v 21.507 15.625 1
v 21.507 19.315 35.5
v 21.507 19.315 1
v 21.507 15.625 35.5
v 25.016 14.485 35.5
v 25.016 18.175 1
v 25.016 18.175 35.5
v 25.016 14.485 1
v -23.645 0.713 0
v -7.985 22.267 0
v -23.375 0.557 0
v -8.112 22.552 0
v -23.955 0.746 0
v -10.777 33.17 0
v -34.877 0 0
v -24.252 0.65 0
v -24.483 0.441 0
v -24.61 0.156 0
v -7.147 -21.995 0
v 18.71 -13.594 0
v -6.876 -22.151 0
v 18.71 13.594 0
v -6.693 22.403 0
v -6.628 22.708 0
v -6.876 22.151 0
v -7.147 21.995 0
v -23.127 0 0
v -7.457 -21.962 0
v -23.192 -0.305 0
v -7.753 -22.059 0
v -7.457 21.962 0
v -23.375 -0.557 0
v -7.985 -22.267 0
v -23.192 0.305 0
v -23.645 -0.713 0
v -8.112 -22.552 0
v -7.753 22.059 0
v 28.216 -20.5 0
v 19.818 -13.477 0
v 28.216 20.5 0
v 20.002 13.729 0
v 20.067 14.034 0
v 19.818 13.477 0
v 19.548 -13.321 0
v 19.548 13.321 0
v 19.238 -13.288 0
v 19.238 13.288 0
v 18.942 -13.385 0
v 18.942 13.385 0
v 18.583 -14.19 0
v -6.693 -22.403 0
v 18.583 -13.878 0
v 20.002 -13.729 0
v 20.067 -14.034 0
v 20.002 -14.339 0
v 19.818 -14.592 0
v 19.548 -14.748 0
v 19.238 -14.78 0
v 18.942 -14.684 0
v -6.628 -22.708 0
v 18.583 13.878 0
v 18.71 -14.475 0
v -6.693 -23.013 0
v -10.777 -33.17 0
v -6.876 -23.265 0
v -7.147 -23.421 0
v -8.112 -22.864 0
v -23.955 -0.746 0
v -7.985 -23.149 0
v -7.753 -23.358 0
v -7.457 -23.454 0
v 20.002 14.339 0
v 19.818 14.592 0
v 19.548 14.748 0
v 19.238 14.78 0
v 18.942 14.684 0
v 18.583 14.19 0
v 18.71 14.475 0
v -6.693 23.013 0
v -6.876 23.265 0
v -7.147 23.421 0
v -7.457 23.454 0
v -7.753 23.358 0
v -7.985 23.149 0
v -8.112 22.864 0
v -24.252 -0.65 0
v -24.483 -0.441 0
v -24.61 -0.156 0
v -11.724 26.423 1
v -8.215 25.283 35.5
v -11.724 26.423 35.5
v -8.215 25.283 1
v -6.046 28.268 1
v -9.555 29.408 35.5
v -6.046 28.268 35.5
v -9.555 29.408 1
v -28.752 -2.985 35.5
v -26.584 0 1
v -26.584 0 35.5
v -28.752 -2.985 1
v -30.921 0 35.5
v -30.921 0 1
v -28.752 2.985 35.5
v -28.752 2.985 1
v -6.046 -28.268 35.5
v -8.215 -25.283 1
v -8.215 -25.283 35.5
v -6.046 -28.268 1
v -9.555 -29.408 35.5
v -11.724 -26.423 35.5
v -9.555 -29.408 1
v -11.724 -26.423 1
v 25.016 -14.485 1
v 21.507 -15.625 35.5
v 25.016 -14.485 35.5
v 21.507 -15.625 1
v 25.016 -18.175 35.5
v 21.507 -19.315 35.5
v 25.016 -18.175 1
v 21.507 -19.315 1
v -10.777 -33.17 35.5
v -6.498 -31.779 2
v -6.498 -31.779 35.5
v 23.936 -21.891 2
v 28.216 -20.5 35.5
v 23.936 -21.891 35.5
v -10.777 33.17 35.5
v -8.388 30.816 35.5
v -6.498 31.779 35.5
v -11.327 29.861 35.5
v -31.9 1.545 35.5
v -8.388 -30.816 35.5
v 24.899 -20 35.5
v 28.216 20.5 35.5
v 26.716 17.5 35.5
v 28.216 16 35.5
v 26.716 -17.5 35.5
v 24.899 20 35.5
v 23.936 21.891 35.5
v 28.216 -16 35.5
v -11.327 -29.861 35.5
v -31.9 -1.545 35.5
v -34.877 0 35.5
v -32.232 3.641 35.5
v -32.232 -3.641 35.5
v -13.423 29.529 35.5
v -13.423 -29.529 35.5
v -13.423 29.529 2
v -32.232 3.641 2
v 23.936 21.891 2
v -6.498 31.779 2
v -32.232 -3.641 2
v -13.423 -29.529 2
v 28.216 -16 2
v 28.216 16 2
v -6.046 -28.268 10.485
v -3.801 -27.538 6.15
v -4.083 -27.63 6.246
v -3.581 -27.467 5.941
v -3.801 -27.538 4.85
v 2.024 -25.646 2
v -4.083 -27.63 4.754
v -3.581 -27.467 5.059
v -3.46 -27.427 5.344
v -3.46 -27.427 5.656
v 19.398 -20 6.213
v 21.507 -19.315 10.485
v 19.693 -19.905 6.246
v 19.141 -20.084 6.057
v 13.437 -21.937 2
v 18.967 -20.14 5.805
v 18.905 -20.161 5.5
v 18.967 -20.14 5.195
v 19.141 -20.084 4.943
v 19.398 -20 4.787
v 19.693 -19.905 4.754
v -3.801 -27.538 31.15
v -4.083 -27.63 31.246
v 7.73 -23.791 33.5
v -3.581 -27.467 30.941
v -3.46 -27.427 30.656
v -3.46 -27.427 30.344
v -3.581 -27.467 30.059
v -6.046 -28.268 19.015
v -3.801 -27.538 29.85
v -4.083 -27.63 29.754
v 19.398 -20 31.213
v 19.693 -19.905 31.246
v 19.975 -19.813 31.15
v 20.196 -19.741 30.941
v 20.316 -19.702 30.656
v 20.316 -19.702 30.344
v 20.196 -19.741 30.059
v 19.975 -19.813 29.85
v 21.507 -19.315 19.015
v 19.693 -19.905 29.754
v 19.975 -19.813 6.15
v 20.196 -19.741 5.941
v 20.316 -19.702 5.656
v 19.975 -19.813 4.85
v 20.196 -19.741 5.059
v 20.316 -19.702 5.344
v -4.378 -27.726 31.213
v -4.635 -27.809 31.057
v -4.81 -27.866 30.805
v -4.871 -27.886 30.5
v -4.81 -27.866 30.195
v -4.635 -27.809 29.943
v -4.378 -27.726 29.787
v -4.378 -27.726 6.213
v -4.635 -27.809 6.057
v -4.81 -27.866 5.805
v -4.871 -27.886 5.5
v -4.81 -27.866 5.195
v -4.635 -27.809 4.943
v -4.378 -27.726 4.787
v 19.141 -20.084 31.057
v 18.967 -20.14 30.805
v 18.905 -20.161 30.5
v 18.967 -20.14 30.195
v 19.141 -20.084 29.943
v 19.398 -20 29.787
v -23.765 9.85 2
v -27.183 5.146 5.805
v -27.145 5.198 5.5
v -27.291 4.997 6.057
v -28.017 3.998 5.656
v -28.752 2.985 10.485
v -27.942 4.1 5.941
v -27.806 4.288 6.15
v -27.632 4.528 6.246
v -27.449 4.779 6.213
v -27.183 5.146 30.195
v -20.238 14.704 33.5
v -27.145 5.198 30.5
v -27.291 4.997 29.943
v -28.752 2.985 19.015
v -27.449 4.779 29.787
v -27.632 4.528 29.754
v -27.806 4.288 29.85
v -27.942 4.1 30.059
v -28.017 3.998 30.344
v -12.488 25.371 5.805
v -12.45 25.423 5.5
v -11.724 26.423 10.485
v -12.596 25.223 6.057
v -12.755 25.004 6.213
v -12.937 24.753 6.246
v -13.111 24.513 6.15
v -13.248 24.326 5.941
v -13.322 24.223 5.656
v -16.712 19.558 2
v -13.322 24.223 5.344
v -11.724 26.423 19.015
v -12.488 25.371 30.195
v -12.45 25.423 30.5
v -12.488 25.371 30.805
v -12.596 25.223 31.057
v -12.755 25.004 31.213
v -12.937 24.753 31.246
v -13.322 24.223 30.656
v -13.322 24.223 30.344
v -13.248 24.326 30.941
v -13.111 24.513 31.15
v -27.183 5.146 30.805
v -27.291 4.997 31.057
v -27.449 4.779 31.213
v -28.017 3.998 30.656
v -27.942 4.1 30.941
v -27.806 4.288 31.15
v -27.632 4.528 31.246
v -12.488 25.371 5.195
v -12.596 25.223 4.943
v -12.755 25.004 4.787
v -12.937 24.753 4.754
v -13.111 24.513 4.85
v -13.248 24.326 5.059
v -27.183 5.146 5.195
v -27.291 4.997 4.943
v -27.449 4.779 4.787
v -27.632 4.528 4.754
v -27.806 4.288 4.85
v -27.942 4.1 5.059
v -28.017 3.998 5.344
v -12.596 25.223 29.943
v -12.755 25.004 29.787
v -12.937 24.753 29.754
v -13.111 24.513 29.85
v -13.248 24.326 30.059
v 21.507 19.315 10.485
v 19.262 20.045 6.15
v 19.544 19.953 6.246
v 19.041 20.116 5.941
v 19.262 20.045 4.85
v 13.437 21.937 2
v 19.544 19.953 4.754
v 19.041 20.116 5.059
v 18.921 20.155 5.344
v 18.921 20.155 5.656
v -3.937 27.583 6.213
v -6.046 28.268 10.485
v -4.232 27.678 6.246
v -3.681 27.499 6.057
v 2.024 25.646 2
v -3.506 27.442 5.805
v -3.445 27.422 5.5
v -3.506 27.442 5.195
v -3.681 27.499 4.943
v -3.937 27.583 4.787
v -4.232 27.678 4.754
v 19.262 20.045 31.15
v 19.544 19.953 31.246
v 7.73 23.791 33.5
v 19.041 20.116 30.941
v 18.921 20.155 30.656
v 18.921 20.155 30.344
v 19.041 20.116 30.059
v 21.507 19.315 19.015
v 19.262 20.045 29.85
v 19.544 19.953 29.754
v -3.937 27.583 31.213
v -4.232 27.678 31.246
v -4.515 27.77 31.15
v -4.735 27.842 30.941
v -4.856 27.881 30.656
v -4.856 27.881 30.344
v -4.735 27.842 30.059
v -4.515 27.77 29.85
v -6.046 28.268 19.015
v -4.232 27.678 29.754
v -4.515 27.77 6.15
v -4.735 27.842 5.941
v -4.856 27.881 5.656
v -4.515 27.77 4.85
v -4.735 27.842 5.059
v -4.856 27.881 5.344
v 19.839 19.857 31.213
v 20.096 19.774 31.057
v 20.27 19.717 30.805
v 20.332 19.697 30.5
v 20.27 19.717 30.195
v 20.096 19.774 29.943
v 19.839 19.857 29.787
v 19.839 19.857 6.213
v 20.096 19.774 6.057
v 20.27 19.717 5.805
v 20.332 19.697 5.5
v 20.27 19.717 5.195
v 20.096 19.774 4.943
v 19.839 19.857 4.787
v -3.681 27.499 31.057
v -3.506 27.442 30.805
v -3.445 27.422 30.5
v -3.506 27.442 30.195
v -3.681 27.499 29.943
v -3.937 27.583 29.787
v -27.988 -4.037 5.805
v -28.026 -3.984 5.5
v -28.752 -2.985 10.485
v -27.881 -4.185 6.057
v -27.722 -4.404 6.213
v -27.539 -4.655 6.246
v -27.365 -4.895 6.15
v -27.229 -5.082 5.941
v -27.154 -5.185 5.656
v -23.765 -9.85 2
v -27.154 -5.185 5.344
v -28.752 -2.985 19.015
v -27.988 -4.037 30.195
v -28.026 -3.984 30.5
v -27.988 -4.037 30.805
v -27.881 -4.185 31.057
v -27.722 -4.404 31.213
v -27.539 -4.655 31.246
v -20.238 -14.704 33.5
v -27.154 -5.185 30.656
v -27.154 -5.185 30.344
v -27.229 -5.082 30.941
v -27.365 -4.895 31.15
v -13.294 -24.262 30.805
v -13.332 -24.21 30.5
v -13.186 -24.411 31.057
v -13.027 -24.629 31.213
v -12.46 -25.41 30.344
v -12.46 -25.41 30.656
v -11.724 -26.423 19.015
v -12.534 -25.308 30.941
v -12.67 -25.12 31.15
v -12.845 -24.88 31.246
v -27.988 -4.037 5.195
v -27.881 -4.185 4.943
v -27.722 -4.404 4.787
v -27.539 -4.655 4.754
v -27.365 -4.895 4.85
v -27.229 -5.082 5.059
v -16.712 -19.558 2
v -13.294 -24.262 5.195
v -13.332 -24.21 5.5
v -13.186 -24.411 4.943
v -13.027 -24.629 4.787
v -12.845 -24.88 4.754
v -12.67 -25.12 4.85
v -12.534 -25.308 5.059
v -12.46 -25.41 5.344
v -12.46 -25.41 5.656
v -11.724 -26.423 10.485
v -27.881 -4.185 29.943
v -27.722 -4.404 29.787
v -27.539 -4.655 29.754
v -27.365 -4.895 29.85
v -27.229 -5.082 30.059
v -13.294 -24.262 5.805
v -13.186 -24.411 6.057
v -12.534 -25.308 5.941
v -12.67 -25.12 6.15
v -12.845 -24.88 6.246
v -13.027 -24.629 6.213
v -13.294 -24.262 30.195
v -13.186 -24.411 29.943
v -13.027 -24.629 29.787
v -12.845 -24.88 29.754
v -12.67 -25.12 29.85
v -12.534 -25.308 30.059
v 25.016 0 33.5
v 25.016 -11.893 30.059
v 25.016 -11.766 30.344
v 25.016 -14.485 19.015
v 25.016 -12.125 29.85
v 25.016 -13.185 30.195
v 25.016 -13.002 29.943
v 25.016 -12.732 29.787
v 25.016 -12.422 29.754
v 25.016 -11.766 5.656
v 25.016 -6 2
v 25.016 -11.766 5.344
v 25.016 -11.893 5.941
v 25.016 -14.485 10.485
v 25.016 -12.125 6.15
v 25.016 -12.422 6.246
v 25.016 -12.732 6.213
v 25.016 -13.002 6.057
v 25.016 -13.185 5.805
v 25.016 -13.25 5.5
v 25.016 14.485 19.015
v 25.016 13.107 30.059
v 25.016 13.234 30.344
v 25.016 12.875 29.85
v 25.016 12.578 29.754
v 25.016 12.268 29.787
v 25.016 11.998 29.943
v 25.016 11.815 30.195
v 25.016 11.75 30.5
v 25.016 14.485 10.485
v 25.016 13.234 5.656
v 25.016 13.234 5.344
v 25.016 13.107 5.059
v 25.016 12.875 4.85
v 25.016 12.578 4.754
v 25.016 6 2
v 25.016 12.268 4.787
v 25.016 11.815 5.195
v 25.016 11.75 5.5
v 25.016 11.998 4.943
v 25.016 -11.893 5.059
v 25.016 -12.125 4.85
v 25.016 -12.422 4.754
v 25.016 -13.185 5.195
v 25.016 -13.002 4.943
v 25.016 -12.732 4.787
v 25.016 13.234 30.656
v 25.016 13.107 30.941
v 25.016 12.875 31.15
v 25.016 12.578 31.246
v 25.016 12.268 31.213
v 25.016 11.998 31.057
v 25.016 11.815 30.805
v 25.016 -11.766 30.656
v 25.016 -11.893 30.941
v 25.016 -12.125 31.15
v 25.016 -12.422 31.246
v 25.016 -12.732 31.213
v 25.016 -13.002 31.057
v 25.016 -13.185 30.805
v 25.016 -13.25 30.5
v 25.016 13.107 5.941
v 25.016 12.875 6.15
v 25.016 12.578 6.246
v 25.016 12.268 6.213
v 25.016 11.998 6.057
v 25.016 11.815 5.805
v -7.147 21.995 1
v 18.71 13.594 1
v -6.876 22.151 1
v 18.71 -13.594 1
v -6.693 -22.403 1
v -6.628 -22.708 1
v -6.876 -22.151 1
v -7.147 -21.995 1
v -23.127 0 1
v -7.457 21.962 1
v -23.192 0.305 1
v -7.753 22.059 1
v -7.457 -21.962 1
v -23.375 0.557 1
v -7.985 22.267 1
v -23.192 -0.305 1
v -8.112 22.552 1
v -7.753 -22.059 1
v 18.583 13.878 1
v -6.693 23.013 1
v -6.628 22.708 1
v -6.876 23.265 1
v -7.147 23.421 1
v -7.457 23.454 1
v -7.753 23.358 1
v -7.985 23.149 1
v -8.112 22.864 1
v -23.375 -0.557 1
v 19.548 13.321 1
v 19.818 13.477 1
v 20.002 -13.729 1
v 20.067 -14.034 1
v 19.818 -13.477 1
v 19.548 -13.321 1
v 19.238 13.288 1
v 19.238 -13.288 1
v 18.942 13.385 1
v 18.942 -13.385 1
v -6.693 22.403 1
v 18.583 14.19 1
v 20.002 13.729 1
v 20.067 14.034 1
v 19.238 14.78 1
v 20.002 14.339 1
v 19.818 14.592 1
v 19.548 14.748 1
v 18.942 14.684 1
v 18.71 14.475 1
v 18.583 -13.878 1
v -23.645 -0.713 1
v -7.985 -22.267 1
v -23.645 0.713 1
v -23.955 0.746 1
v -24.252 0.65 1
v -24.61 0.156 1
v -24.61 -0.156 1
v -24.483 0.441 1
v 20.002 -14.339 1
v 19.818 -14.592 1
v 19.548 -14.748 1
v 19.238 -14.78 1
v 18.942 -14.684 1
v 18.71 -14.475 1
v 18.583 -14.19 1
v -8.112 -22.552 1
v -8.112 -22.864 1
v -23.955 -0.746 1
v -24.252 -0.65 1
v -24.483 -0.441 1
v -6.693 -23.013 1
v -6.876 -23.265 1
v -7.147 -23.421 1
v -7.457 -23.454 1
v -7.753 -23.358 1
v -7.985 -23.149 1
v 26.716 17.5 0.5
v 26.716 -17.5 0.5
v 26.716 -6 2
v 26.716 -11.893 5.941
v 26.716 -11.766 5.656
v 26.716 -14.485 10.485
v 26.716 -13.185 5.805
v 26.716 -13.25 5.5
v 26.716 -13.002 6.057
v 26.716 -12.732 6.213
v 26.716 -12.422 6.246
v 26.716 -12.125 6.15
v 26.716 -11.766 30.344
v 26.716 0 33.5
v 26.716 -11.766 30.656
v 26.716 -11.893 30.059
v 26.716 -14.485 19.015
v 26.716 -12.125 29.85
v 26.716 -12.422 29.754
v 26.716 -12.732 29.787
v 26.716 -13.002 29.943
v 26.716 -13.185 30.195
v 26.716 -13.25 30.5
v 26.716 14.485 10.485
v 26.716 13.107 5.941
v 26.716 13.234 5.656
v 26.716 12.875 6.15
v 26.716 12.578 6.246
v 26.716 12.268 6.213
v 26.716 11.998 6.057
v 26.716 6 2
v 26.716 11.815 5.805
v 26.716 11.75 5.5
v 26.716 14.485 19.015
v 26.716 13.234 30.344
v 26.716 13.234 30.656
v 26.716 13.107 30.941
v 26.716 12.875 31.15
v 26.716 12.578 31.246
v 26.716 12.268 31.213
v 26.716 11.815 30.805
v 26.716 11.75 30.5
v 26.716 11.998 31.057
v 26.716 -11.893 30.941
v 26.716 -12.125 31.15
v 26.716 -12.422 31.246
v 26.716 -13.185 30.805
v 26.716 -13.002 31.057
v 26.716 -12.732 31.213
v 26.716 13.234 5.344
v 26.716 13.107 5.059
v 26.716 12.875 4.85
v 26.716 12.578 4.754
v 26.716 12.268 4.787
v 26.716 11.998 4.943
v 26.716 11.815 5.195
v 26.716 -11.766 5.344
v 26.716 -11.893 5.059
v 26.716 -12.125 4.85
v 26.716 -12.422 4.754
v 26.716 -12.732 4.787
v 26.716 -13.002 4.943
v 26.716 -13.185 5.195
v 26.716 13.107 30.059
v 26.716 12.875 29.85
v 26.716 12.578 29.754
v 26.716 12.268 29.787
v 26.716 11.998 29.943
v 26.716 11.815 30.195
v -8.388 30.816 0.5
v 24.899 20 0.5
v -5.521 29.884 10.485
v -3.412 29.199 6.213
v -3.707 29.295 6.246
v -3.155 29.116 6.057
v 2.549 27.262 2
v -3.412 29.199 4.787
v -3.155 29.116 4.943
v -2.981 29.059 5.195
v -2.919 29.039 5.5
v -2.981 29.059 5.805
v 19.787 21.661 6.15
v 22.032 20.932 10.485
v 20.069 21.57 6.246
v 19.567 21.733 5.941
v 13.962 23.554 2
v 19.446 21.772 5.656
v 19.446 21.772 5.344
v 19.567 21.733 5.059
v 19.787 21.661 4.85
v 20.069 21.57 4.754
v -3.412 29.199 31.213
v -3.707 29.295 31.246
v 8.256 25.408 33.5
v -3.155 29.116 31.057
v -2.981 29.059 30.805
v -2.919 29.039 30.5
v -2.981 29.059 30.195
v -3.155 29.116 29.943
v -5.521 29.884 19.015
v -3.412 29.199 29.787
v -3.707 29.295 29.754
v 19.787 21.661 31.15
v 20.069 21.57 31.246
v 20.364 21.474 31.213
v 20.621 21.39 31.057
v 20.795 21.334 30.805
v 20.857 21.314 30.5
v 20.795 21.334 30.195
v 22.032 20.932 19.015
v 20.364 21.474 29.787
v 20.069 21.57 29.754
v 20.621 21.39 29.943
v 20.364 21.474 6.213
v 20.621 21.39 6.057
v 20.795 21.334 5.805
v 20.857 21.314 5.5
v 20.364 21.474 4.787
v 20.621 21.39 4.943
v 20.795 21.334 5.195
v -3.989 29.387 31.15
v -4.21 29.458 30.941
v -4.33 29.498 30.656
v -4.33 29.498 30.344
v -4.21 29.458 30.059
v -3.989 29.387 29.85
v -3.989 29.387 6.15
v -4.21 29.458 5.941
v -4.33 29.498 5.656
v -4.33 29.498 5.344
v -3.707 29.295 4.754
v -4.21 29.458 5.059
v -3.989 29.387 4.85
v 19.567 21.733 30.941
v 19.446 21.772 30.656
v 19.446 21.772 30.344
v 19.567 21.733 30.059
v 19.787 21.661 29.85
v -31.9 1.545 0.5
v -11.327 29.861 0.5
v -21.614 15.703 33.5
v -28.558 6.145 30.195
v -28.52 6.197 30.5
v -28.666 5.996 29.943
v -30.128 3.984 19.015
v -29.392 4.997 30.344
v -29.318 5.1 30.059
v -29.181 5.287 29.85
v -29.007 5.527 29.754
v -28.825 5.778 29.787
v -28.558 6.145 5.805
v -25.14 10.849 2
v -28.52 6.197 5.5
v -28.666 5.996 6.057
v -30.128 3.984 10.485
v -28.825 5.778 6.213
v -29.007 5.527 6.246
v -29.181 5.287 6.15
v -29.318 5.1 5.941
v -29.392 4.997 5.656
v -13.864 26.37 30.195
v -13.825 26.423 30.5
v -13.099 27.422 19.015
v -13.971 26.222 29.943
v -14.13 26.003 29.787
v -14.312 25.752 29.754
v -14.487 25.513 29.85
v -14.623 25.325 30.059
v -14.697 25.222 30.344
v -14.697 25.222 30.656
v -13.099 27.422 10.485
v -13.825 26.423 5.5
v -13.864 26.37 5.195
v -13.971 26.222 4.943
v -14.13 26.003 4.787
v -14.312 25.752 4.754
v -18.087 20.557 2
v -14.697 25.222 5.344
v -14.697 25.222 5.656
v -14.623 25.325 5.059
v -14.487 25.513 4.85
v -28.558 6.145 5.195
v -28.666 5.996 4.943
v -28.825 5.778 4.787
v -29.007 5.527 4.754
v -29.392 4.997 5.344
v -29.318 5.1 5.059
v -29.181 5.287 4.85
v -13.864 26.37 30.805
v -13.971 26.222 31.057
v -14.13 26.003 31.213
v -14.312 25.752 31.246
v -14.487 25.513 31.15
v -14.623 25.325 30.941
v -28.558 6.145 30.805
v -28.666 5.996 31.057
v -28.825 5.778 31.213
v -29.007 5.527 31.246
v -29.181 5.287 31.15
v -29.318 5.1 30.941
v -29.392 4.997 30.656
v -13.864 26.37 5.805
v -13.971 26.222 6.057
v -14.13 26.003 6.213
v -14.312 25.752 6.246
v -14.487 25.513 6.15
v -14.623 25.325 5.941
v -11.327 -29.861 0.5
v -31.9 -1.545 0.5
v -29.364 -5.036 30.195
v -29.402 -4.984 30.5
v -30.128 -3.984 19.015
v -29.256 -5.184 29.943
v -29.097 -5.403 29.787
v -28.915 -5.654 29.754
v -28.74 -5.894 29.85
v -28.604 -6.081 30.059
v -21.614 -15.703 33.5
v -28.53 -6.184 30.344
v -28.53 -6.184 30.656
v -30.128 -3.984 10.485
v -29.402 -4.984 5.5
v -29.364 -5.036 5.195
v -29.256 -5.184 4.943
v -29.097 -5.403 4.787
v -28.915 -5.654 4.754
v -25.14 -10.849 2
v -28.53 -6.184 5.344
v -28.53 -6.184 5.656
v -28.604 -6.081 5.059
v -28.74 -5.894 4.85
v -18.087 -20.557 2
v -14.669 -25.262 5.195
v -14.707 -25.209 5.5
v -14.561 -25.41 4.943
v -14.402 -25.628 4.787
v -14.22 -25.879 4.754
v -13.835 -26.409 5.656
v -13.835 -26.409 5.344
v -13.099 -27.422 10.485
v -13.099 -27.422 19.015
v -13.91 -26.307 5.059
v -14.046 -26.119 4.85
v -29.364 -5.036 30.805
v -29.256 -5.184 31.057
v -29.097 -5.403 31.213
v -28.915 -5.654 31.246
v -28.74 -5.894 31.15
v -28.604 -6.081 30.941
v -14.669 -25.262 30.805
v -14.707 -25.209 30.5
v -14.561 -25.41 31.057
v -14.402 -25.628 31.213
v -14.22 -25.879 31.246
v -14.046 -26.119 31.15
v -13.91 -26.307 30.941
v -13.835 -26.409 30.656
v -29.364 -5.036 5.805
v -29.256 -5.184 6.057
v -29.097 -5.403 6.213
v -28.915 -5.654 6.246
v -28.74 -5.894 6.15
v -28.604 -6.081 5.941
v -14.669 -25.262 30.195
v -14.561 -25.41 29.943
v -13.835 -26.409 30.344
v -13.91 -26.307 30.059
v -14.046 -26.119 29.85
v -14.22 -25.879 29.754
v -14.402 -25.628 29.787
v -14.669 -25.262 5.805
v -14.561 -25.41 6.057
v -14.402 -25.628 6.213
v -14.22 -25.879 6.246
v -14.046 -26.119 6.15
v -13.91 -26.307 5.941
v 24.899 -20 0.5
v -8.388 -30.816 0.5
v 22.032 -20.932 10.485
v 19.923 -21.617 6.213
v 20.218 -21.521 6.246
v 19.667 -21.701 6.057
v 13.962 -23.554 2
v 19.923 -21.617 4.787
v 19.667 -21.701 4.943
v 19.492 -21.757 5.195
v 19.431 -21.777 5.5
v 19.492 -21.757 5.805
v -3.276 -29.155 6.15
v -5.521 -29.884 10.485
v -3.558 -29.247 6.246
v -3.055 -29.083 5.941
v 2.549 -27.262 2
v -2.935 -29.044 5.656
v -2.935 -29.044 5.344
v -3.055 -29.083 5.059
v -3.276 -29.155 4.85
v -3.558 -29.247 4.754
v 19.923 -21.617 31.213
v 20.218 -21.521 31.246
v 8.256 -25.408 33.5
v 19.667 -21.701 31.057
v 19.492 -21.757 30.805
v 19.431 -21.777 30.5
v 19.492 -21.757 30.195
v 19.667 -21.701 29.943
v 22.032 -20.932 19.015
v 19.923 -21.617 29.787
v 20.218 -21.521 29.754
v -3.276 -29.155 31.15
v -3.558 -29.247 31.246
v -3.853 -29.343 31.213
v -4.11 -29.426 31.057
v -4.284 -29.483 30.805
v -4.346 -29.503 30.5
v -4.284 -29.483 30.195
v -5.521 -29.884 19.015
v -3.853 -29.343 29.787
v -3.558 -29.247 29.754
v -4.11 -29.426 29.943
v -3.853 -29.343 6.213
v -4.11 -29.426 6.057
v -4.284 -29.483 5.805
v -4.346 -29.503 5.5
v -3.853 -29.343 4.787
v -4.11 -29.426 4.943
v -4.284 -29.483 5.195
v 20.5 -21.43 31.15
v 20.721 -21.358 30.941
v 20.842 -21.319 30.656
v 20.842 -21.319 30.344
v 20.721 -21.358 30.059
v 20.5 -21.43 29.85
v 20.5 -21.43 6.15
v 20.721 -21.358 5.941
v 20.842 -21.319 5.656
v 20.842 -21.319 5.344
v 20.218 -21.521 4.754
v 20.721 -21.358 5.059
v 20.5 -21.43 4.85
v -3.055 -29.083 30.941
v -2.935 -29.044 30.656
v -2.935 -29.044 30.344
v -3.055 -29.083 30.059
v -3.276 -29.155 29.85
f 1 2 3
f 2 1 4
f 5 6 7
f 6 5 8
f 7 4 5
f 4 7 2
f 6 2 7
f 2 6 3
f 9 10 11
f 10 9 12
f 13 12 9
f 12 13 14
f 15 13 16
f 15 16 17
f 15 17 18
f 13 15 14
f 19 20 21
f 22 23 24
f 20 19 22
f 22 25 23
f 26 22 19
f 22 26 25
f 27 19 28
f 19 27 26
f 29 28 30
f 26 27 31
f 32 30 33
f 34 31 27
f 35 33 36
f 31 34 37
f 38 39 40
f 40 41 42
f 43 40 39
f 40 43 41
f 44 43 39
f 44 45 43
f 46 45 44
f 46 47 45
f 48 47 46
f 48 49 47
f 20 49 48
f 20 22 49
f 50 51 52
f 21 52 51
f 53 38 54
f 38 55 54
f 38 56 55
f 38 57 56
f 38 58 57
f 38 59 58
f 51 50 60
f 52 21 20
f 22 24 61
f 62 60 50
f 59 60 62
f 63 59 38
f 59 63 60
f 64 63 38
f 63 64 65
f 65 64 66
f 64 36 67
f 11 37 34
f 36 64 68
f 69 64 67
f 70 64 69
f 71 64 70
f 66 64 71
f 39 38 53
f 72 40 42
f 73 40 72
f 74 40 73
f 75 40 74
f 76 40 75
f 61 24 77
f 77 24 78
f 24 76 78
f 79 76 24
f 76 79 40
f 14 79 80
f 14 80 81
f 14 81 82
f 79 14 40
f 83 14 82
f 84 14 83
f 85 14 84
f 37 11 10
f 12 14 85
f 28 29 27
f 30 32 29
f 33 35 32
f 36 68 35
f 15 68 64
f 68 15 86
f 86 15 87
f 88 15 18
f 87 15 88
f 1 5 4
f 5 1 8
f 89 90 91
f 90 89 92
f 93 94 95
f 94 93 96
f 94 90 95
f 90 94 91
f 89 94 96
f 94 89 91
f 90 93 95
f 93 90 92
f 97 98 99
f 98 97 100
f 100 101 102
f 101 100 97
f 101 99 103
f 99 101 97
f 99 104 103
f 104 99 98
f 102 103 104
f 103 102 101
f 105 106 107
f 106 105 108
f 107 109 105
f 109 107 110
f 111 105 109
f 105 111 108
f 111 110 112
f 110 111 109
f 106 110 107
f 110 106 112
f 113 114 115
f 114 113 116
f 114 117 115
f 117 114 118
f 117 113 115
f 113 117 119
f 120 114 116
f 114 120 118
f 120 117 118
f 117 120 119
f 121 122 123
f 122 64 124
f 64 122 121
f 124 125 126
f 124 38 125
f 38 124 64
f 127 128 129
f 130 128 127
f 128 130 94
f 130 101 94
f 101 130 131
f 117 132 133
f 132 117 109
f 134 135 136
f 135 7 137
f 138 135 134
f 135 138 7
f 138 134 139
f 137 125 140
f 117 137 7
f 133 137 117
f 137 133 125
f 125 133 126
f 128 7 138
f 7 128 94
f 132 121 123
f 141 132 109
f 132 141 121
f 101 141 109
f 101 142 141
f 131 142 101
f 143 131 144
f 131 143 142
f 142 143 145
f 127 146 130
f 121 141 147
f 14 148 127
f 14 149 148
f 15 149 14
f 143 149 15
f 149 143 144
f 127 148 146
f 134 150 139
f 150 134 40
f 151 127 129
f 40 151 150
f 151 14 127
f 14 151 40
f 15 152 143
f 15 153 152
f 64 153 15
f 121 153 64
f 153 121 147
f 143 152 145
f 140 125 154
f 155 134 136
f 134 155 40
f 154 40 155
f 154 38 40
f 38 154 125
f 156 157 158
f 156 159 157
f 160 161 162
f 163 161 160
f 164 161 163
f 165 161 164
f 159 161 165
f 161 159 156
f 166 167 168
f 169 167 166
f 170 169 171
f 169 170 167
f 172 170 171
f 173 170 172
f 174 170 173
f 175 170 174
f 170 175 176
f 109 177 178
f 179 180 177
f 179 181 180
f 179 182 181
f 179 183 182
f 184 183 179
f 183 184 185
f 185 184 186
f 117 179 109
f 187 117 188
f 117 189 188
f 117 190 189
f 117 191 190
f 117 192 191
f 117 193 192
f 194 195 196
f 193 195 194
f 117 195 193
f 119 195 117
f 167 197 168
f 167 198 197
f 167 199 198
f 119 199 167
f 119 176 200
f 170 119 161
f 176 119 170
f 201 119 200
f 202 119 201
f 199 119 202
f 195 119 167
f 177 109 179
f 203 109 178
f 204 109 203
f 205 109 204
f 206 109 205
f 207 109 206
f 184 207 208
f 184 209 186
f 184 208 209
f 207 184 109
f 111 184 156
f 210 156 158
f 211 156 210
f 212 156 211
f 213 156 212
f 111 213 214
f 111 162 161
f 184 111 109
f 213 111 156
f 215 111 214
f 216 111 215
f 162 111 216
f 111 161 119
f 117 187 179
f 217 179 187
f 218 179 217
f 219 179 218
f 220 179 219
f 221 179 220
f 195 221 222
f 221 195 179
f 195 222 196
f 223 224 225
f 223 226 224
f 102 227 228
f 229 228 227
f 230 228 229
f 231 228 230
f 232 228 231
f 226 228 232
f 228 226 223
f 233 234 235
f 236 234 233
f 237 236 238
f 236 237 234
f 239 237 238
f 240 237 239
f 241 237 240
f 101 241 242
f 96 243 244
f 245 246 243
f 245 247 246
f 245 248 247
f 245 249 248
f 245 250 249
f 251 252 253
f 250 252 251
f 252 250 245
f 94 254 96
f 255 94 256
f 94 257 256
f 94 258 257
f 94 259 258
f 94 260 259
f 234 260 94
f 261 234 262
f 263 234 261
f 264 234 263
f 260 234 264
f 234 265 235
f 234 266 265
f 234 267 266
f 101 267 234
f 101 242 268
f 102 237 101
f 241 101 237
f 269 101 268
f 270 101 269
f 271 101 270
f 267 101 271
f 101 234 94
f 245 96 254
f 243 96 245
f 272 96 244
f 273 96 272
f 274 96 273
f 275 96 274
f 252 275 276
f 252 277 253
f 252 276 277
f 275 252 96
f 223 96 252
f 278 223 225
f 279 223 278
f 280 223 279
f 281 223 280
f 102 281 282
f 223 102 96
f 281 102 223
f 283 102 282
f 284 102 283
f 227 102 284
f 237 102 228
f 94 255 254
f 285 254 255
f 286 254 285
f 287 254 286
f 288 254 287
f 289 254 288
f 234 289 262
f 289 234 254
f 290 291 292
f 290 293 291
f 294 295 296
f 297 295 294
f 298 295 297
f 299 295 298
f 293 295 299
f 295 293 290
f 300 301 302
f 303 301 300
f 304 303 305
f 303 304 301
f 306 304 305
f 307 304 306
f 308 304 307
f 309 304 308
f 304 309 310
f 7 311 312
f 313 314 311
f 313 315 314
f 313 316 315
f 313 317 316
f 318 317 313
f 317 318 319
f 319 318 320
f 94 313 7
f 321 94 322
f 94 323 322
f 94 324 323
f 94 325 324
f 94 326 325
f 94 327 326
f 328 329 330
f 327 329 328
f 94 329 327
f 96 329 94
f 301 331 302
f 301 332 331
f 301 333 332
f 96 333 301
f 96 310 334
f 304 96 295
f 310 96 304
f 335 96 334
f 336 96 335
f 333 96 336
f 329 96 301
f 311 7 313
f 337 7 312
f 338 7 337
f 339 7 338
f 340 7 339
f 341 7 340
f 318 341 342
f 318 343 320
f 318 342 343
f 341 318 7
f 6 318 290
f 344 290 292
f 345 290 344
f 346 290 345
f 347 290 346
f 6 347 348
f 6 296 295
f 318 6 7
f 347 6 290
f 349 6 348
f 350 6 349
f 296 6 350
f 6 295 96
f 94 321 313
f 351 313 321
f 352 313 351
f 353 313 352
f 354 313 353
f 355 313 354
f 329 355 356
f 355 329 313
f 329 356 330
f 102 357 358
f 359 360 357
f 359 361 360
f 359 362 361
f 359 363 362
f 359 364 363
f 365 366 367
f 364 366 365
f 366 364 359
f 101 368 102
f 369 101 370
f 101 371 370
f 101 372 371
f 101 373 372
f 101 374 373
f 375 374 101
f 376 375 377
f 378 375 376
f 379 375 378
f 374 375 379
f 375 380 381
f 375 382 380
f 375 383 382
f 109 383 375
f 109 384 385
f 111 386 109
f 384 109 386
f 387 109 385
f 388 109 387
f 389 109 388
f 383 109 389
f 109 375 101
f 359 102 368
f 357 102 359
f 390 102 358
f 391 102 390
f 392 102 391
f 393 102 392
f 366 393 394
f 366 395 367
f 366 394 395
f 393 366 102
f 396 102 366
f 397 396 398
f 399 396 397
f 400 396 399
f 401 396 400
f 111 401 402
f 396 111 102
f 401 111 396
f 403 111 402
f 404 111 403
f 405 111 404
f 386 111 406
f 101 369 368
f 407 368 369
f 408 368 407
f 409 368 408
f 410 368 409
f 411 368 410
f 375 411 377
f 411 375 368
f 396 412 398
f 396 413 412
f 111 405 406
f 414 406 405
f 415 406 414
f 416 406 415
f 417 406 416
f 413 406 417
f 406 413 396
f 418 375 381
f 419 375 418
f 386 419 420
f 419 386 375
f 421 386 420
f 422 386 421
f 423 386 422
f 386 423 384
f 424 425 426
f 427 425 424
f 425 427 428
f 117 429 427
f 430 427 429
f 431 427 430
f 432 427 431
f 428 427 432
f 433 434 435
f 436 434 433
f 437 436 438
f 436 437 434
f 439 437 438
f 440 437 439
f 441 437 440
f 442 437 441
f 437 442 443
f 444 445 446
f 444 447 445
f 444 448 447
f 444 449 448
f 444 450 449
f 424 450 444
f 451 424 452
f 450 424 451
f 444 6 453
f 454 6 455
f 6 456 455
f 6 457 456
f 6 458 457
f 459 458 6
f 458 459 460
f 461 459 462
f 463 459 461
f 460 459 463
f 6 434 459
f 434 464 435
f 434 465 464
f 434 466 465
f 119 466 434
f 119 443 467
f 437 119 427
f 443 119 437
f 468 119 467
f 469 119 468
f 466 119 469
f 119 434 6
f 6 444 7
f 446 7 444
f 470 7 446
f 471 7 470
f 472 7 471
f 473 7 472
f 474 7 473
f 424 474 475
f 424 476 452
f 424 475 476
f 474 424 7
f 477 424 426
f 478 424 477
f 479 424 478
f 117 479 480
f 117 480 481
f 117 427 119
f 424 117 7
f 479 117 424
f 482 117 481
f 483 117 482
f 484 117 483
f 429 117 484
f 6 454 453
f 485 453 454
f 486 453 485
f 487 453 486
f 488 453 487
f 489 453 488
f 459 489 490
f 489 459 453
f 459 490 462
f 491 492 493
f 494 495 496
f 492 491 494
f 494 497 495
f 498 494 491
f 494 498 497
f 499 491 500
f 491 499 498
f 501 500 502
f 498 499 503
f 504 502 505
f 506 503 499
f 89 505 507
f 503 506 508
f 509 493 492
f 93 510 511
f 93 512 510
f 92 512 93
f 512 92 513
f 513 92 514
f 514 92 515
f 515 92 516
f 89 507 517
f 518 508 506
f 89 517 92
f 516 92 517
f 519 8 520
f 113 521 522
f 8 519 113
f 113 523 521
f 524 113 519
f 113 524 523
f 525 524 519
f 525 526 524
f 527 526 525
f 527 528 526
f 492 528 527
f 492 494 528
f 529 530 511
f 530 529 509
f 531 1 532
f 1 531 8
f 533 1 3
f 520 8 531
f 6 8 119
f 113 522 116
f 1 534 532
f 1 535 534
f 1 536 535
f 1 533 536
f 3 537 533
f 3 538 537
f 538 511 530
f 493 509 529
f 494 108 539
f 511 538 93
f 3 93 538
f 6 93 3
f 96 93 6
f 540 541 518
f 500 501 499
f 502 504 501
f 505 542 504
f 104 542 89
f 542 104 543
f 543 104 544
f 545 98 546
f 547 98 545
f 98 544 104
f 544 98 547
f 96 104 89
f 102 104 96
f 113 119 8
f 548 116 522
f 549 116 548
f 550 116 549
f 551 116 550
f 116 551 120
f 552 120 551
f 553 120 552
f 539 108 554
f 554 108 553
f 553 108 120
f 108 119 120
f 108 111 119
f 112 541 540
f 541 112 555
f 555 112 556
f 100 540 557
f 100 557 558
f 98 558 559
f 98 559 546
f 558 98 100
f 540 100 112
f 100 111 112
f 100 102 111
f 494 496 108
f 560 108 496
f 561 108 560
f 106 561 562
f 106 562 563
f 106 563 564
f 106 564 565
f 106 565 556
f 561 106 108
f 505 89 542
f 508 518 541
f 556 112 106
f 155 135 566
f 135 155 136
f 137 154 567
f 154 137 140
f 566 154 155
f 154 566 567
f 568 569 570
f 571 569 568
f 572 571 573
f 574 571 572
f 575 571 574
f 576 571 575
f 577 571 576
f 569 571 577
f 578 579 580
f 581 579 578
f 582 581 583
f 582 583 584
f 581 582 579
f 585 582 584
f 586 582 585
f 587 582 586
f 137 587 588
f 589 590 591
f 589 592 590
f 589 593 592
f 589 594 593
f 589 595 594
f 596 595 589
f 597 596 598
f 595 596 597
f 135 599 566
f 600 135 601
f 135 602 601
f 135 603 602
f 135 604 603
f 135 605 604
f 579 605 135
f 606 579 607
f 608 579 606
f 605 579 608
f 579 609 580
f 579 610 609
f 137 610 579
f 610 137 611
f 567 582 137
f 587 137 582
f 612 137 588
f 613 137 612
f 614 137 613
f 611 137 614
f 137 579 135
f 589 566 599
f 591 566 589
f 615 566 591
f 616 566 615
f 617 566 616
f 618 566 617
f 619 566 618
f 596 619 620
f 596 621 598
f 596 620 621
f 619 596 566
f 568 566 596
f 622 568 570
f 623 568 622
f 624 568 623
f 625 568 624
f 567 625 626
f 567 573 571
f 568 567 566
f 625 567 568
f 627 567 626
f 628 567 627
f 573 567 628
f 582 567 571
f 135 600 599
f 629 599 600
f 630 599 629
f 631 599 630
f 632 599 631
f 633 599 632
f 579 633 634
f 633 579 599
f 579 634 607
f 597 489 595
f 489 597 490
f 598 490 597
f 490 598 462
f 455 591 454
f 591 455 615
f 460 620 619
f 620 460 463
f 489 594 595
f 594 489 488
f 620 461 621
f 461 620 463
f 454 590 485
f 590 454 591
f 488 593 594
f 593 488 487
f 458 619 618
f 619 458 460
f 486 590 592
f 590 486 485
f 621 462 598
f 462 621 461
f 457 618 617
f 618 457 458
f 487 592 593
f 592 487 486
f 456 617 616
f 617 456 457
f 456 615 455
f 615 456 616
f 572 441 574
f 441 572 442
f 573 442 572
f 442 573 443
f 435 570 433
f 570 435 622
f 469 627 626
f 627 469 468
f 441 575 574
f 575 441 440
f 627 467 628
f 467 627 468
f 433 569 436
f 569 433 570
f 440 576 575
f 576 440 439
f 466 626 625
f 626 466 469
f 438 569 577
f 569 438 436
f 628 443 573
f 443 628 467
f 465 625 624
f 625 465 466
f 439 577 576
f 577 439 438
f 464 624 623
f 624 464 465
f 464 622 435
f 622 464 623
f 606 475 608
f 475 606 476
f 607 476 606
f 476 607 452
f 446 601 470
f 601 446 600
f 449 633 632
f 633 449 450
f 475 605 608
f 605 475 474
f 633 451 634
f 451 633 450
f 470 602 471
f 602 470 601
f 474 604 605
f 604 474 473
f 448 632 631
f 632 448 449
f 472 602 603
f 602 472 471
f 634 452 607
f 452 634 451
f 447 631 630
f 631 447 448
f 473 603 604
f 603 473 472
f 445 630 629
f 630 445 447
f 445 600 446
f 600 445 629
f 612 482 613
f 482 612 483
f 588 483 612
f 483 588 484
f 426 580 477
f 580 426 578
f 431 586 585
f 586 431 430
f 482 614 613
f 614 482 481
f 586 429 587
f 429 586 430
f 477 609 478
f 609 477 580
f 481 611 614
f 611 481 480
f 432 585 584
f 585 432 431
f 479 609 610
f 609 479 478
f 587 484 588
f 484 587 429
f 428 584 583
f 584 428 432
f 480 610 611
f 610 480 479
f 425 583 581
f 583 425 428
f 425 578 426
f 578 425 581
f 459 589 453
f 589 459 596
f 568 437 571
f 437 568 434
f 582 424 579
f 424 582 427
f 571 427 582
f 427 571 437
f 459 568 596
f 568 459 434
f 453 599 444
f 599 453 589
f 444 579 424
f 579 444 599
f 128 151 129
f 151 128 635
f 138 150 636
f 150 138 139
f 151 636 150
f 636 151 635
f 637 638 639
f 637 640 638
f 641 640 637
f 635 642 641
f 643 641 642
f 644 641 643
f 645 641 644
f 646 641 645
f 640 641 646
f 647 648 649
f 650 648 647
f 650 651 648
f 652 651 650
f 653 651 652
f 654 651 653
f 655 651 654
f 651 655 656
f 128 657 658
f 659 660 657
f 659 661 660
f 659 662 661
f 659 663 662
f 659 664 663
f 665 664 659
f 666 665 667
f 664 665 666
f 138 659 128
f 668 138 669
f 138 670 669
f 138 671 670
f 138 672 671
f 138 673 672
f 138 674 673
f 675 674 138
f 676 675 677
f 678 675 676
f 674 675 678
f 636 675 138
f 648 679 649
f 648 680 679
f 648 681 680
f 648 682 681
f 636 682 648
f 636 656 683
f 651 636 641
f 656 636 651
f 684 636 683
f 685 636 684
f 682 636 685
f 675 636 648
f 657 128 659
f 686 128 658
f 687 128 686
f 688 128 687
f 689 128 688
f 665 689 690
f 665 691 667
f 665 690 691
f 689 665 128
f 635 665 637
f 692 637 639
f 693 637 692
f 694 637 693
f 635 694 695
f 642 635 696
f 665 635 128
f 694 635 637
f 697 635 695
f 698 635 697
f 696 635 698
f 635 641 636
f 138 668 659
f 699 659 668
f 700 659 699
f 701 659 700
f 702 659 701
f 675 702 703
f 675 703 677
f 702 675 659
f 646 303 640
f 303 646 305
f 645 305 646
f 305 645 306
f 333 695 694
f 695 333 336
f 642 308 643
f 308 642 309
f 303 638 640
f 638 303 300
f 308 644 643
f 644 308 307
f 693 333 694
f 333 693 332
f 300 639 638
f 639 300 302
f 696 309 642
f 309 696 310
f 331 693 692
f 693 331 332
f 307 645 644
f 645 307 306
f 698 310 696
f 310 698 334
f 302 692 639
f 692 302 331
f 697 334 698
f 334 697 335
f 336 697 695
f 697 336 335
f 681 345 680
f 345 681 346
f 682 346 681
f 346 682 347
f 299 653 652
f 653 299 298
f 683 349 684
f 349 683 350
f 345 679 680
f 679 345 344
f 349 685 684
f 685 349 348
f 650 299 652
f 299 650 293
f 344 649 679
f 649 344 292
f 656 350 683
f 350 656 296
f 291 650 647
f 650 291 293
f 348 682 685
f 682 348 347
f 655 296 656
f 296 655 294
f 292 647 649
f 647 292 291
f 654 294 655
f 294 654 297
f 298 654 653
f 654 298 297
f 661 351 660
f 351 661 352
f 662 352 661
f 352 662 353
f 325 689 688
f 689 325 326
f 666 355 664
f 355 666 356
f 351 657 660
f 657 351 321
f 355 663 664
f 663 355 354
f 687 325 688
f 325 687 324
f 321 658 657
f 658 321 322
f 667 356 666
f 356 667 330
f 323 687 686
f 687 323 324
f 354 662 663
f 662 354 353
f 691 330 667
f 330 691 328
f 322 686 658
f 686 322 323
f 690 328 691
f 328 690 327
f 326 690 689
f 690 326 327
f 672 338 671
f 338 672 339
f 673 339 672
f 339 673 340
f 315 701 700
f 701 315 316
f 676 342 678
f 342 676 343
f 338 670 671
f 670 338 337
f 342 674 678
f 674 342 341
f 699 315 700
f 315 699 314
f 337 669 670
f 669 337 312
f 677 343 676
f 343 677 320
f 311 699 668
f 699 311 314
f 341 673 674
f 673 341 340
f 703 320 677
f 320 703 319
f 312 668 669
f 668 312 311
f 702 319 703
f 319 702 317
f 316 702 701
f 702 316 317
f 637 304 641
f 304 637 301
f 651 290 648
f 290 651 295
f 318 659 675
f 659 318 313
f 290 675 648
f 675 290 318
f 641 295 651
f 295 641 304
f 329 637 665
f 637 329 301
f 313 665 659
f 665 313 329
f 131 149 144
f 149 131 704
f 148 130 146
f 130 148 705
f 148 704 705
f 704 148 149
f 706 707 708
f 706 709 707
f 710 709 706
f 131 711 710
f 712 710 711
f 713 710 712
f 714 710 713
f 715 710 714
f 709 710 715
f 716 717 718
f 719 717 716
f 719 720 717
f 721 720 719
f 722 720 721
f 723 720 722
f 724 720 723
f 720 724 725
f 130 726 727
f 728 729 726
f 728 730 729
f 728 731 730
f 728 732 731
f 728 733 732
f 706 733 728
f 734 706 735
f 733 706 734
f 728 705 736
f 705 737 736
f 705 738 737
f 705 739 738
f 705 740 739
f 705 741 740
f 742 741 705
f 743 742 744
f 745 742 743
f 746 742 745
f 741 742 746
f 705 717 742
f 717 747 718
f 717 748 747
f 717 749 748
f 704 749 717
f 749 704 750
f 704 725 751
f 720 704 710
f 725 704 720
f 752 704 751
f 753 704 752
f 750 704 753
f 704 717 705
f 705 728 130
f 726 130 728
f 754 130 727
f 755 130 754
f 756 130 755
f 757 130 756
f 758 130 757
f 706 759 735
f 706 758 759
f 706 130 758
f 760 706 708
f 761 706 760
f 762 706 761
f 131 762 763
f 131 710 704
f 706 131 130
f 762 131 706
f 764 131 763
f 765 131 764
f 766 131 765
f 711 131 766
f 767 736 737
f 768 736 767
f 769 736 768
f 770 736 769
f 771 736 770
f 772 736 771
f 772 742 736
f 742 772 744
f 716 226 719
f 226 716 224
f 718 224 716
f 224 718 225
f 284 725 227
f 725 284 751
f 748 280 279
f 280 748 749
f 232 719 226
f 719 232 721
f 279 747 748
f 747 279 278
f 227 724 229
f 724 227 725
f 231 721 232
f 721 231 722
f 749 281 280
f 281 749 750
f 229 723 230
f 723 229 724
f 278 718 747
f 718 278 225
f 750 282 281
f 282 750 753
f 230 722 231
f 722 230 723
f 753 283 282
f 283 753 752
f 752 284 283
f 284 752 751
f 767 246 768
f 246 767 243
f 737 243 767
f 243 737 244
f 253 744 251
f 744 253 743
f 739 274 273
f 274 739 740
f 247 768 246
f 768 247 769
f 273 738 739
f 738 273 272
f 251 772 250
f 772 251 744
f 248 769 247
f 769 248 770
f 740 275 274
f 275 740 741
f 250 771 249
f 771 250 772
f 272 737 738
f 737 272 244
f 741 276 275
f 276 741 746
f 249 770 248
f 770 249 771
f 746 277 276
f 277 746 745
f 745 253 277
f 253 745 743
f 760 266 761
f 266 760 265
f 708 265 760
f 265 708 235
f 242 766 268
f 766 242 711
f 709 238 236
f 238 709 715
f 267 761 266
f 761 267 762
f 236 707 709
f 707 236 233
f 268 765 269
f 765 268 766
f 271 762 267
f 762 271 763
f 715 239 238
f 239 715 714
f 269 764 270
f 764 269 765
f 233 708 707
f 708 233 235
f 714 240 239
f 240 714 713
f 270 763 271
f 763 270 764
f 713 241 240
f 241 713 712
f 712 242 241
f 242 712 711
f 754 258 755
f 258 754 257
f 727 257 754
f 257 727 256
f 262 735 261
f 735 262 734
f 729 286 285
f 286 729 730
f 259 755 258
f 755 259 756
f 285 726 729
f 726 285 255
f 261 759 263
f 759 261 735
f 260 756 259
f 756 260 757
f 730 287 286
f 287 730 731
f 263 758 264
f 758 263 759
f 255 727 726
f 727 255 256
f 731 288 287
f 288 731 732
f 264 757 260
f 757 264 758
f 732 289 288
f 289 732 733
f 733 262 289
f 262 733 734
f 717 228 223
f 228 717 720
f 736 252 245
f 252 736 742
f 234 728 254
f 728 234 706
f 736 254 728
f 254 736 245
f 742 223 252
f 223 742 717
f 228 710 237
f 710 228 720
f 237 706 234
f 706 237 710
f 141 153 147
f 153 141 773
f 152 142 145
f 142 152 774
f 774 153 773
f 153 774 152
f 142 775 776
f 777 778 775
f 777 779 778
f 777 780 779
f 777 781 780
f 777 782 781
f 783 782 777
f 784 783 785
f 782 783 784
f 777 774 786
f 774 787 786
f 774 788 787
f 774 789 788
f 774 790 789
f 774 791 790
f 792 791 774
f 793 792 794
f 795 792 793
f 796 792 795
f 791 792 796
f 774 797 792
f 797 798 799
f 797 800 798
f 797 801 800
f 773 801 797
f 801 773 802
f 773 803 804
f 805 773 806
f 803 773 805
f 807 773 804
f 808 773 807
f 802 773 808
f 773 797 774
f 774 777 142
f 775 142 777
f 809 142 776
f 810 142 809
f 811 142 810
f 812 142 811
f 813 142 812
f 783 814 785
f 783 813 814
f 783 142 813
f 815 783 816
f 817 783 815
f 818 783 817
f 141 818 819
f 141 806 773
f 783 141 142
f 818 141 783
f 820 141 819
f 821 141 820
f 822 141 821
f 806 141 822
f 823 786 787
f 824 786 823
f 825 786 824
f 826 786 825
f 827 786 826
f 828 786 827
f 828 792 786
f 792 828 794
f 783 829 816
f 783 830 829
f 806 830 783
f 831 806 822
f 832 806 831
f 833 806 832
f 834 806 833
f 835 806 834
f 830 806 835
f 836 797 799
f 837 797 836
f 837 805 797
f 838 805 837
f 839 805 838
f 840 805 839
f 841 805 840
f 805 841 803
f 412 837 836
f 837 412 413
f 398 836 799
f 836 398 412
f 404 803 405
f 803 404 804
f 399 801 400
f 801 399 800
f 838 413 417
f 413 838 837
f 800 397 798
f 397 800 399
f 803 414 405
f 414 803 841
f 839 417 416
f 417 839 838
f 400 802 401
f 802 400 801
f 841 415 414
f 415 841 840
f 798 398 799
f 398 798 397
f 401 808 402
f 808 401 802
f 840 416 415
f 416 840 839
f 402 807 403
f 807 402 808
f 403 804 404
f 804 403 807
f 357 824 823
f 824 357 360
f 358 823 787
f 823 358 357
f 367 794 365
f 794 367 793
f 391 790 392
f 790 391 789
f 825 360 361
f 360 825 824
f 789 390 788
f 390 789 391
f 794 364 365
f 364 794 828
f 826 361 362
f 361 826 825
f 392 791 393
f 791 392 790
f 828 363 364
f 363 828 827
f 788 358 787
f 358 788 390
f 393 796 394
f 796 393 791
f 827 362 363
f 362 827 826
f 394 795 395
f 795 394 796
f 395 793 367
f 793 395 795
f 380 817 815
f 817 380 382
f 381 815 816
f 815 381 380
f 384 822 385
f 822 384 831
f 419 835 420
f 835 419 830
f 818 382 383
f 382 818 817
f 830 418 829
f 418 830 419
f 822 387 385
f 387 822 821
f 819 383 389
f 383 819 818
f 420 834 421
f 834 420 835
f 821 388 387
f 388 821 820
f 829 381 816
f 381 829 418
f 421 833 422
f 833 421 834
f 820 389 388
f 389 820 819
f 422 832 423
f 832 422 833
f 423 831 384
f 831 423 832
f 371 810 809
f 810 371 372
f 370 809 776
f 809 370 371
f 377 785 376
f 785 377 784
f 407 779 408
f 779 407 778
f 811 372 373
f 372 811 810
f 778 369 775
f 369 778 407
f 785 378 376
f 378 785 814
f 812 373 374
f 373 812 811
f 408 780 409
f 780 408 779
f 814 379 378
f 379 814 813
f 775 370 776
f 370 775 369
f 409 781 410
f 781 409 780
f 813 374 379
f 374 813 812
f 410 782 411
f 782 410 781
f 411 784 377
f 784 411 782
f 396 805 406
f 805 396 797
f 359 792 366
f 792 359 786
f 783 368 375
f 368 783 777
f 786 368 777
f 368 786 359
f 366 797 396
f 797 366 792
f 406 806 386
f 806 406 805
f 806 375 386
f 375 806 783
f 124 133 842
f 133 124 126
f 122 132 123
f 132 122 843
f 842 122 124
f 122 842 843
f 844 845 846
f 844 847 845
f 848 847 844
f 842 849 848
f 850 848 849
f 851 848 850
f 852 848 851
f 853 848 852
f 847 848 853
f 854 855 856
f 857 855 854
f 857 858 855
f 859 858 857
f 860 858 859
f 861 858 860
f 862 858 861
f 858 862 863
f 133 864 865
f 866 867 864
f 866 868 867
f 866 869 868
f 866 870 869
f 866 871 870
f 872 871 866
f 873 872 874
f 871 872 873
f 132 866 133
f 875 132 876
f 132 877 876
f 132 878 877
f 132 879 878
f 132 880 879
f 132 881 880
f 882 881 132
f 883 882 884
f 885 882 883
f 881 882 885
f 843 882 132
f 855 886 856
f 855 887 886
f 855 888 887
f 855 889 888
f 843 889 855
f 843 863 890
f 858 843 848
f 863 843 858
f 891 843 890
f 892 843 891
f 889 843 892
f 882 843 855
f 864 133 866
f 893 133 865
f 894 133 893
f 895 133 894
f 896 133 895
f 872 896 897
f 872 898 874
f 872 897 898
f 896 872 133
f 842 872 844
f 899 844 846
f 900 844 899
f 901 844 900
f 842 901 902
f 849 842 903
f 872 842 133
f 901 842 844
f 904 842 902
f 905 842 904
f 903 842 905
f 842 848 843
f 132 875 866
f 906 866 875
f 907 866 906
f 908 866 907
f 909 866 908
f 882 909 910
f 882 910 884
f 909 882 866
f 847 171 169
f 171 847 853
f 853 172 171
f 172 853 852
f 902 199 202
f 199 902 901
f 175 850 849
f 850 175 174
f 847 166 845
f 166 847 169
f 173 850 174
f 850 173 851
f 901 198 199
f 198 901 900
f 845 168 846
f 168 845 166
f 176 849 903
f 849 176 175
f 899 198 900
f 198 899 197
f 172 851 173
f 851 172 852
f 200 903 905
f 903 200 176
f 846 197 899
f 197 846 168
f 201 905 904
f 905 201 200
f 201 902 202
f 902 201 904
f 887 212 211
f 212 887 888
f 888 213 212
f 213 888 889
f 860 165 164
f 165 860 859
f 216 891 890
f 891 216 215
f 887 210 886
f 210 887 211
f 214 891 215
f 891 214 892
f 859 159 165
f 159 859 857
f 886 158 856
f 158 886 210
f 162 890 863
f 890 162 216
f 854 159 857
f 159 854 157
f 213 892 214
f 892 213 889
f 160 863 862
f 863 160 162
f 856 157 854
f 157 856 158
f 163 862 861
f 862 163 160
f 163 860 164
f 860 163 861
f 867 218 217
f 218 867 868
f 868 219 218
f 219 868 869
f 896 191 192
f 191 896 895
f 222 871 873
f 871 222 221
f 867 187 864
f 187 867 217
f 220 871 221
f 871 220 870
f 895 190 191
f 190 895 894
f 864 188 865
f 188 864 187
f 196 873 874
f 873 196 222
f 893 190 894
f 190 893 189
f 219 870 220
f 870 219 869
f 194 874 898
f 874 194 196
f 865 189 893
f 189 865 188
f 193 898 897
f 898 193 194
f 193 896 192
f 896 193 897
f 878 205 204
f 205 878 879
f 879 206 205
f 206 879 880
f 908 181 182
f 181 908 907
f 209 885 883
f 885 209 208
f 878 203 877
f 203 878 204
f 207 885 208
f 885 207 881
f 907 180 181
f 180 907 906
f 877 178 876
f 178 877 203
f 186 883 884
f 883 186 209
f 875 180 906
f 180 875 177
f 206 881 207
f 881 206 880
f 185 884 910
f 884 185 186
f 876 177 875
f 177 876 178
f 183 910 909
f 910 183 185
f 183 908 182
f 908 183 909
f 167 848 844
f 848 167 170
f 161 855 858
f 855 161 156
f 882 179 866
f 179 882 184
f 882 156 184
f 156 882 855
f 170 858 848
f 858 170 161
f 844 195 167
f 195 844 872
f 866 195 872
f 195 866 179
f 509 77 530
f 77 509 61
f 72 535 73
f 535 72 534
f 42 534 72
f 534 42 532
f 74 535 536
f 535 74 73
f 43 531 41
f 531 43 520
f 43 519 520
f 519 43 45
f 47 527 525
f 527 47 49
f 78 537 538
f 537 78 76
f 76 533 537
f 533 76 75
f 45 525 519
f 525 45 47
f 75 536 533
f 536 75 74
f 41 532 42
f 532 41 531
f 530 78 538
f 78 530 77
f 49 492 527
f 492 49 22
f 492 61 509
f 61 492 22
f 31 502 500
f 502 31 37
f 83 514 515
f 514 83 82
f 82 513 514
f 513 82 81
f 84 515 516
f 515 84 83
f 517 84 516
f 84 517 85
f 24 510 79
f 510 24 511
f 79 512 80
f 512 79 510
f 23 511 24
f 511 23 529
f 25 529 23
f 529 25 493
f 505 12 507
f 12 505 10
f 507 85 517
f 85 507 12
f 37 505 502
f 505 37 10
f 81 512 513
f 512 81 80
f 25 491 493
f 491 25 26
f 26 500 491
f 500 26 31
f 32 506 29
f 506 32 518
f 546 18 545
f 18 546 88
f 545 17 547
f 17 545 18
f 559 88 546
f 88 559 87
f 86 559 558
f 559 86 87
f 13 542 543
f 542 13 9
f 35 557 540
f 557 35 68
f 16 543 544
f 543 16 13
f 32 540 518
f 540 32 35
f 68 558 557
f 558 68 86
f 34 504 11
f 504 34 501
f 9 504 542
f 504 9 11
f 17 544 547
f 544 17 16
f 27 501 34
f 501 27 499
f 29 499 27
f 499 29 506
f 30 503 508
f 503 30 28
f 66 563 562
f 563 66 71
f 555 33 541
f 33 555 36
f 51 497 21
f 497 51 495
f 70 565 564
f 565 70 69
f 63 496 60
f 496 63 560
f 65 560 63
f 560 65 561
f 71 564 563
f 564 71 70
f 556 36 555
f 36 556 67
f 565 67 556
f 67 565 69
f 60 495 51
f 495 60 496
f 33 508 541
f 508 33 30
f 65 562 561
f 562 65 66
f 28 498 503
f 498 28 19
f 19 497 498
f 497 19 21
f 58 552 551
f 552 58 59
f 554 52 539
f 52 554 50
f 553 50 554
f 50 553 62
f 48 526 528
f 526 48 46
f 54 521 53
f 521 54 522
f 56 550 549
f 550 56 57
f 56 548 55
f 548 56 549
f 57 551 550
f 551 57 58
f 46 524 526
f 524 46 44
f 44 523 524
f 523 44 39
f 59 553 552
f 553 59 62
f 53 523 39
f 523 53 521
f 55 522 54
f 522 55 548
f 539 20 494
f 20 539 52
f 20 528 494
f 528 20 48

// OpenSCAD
// TODO: define correctly the 3-faced Prism and 4-faced Prism as core

/***************************Prism launcher****************************
*	prism(n, Iscore)
*	n = faceNumber
*	IsCore = true to add the chipset support and false if not
**********************************************************************/
	
	prism(5 ,FALSE);

/**************************Constant Parameter*************************/
		SIDE = 41;
		PRISM_HEIGHT = 35.5;
		SLOT_SIDE = 35;    // (mm) must be the dimension of slot, not face (allow for fit)
		SLOT_THICKNESS = 1.5;
		HOLE_GAP = 25;    // (mm) distance between holes for attaching plates
		DISTANCE_BASIS_HOLE_CORNER = 11; // (mm) distance between corner and a hole in the basis
		SHIP_SIDE = 30;
		BATTERY_HEIGHT = 14;
		BATTERY_WIDTH = 19;
		BATTERY_LENGTH = 34;

		SUPPORT_SHIP_HEIGHT = BATTERY_HEIGHT + 4;
		BASE_THICKNESS = 1;
		SUPPORT_THICKNESS = 2;
		
		TRUE = 1;
		FALSE = 0;
		
/**************************Main Module*************************/
module prism(n, isCore){
	radius = SIDE/(2*sin(360/(2*n)));
	radius_inner = radius - (3.2/(cos(360/(2*n)))); //(SIDE-3.2*2)/(2*sin(360/(2*n)));
	//parameter for the slot hole	
	centerBase = 12;
	baseLength = 12;
	bottomDiag = 12;
	
	union(){
		if(isCore){
			shipSupport();
		}
		cornerRenforcement(n, baseLength, bottomDiag);
		difference(){
			rotate([0, 0, 360/(2*n)]){//first face always normal to x axis
				difference(){		
					cylinder(r = radius, h = PRISM_HEIGHT, $fn = n); //shape
					translate([0, 0, BASE_THICKNESS]) 
						cylinder(r = radius_inner, h = PRISM_HEIGHT, $fn = n); //shape
				}	
			}

			for (i = [0:n-1]){ //place at each face
				rotate([0, 0, i*360/n]) 
				translate(radius*cos(360/(2*n))*[1,0,0]) 
					slotNegative(n,centerBase, baseLength, bottomDiag);
			}
			basisHole(n);
		}
	}
}

/**************************Secondary Module*************************/

//is a losange shape
module cornerRenforcement(n, baseLength, bottomDiag){
	prismAngle = 360/n;
	radius = SIDE/(2*sin(360/(2*n)));
	radius_inner = radius - (3.2/(cos(360/(2*n))));

	//corner of the losange
	innerSide = 2*radius_inner*sin(prismAngle/2);
	renforcementSide = (innerSide - baseLength)/2 - bottomDiag*cos(45);	
	cornerAngle = 180-prismAngle;
	smallDiag = 2*renforcementSide*cos(cornerAngle/2);
	bigDiag = 2*renforcementSide*sin(cornerAngle/2);

	c1X = smallDiag/2;
	c1Y = 0;

	c2X = 0;
	c2Y = bigDiag/2;
	c4X = 0;
	c4Y = -c2Y;
		
	c3X = -c1X;
	c3Y = 0;
		
	for(i = [0:n-1]){
		rotate([0,0,i*prismAngle])
		translate((radius_inner-smallDiag/2)*[cos(prismAngle/2),sin(prismAngle/2),0]) 
		rotate([0,0,prismAngle/2])
		linear_extrude(height = PRISM_HEIGHT)
			polygon(points=[[c1X,c1Y], 
							 [c2X,c2Y],
							 [c3X,c3Y],
							 [c4X,c4Y]], convexity=10);
	}
}

	////////////////////////////////////////////////////////////
	// Negative shape of slot hole to be applied on all sides. 
	// The zero is in the middle of the slot, outer face
module slotNegative(n,centerBase, baseLength, bottomDiag){
	
	union(){
		slotConnection(n);
		slotHole(centerBase, baseLength, bottomDiag);
	}
}

module shipSupport() {
	
	shipDiag = sqrt(SHIP_SIDE*SHIP_SIDE*2);
	radius = shipDiag/2;
	innerRadius = shipDiag/2-SUPPORT_THICKNESS;

	translate([0,0,BASE_THICKNESS])
	rotate([0, 0, 45])
		union(){
			shipExtrusion(innerRadius);
			batteryExtrusion();
			difference(){
				cylinder(r = radius, h = SUPPORT_SHIP_HEIGHT, $fn = 4);
			
				cylinder(r = innerRadius, h = SUPPORT_SHIP_HEIGHT+1, $fn = 4);
				supportHole();
			}
		}
}

module batteryExtrusion(){
	rotate([0,0,-45])
		difference(){
				cube([BATTERY_LENGTH/3,BATTERY_WIDTH,SUPPORT_THICKNESS], true);
			
				cube([BATTERY_LENGTH/3+1,BATTERY_WIDTH-2*SUPPORT_THICKNESS,SUPPORT_THICKNESS+1], true);
			}
}

module shipExtrusion(innerRadius){
 	
	l=2*SUPPORT_THICKNESS+1;
		
	trianglePoints = [
  		[  0,  0,  0 ],  //0
  		[ -l,  0,  0 ],  //1
  		[ 0,  l,  0 ],  //2
  		[  0,  0,  l ]];  //3
  
	triangleFaces = [
  		[0,1,2],  	  // bottom
  		[0,3,1],  
  		[0,2,3],  
  		[1,3,2]];
 
	for(i = [0:3]){
		rotate([0,0,i*90])
		translate([0,-innerRadius,SUPPORT_SHIP_HEIGHT-SUPPORT_THICKNESS])
		rotate([0,180,45])  
		polyhedron( trianglePoints, triangleFaces );
	}
}


module supportHole(){
	extrudeHeight = SHIP_SIDE+1;
	c1X = 0;
	c1Y = SHIP_SIDE/2-SUPPORT_THICKNESS;

	c2X = c1X;
	c2Y = -c1Y;
		
	c3X = SUPPORT_SHIP_HEIGHT-SUPPORT_THICKNESS;
	c3Y = 0;
		
	for(i = [0:1]){
		rotate([0,0,i*90])
		rotate([0,-90,45])
		translate([0,0,-extrudeHeight/2])
		linear_extrude(height = extrudeHeight)
			polygon(points=[	 [c1X,c1Y], 
							 [c2X,c2Y],
							 [c3X,c3Y]], convexity=10);
	}
}

module slotConnection(n){ 

	rotate([0, 0, -90]) 
	translate([-SLOT_SIDE/2, -SLOT_THICKNESS, 0.5]) 
	union(){
		difference(){ // plate
			cube ([SLOT_SIDE, SLOT_THICKNESS+0.5, SLOT_SIDE+1]);  // main plate
			union(){ 	 // chamfer the edges
				translate([0,0,-1]) 
				rotate([0,0,45]) 
					cube([sqrt(2)*SLOT_THICKNESS,sqrt(2)*SLOT_THICKNESS, SLOT_SIDE+2]);
				translate([SLOT_SIDE,0,-1]) 
				rotate([0,0,45]) 
					cube([sqrt(2)*SLOT_THICKNESS,sqrt(2)*SLOT_THICKNESS, SLOT_SIDE+2]);
				translate([-1,0,0]) 
				rotate([90,45,90]) 
					cube([sqrt(2)*SLOT_THICKNESS,sqrt(2)*SLOT_THICKNESS, SLOT_SIDE+2]);
			}
		}
		translate([(SLOT_SIDE-HOLE_GAP)/2, 0, (SLOT_SIDE-HOLE_GAP)/2]) 
		rotate([90, 0, 0]) 
			cylinder(h = 6, r = 1.5/2, $fn = 15);
		translate([(SLOT_SIDE-HOLE_GAP)/2+HOLE_GAP, 0, (SLOT_SIDE-HOLE_GAP)/2]) 
		rotate([90, 0, 0]) 
			cylinder(h = 6, r = 1.5/2, $fn = 15);
		translate([(SLOT_SIDE-HOLE_GAP)/2, 0, (SLOT_SIDE-HOLE_GAP)/2+HOLE_GAP]) 
		rotate([90, 0, 0]) 
			cylinder(h = 6, r = 1.5/2, $fn = 15);
		translate([(SLOT_SIDE-HOLE_GAP)/2+HOLE_GAP, 0, (SLOT_SIDE-HOLE_GAP)/2+HOLE_GAP]) 
		rotate([90, 0, 0]) 
			cylinder(h = 6, r = 1.5/2, $fn = 15);
		
	}
}

module slotHole(centerBase, baseLength, bottomDiag){
//With the rotation done: -X=Z and Y=Y 		
		extrudeHeight = 10;

		//corner of the polygon
		c1X = centerBase;
		c1Y = -(baseLength/2);
		c2X = c1X;
		c2Y = -c1Y;
		
		c3X = c2X - bottomDiag*sin(45);
		c3Y = c2Y + bottomDiag*cos(45);
		
		c5X = centerBase-PRISM_HEIGHT + 2*SUPPORT_THICKNESS;//c4X-c3Y*tan(45);
		c5Y = 0;

		c4X = c5X + c3Y;//tan(45) = 1;
		c4Y = c3Y;

		c7X = c1X - bottomDiag*sin(45);
		c7Y = c1Y - bottomDiag*cos(45);
		
		c6X = c4X;
		c6Y = c7Y;
		
		translate([-extrudeHeight/2,0,centerBase+2])
		rotate([0,90,0])
		linear_extrude(height = extrudeHeight)
			polygon(points=[	 [c1X,c1Y], 
							 [c2X,c2Y],
							 [c3X,c3Y],
							 [c4X,c4Y],
							 [c5X,c5Y],
							 [c6X,c6Y],
							 [c7X,c7Y]], convexity=10);
}

//do the hole in the basis
module basisHole(n){
	prismAngle = 360/n;
	distanceFaceCenter = 0.5*SIDE/(tan(360/(2*n)));
	for(i = [0:n-1]){
		rotate([0,0,i*prismAngle])
		translate(-DISTANCE_BASIS_HOLE_CORNER*[cos(prismAngle/2),sin(prismAngle/2),0]) 
		translate([distanceFaceCenter,SIDE/2,-3]) 
			cylinder(h = 6, r = 1.5/2, $fn = 15);
	}
}
